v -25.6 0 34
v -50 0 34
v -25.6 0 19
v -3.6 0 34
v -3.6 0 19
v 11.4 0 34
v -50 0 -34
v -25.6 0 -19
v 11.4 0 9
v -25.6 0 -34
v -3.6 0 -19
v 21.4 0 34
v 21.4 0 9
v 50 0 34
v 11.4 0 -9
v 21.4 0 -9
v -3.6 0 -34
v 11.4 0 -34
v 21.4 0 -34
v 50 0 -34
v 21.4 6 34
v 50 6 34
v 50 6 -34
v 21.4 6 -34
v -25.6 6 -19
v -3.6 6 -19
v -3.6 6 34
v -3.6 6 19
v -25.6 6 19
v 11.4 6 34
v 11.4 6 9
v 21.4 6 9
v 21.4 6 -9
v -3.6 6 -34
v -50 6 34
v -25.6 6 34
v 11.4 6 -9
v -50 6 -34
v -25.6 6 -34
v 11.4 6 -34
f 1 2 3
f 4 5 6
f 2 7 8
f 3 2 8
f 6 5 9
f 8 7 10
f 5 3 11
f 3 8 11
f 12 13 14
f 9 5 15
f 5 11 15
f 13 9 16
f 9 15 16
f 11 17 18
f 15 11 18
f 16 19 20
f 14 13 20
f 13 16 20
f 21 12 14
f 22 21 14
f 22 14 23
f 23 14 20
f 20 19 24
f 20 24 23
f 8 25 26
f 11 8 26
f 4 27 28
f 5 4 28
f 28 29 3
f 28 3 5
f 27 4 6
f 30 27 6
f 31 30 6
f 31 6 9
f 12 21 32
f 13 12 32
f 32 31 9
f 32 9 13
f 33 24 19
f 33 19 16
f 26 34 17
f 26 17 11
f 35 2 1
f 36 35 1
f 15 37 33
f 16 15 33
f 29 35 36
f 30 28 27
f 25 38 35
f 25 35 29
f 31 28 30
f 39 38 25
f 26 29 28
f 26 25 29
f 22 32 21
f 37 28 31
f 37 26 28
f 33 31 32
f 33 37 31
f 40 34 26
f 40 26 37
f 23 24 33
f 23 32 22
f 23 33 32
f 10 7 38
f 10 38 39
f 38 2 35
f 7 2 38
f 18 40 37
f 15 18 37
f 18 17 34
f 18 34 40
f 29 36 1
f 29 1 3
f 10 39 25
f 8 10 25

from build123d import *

# Parameters (mm, degrees)
SKETCH1_W           = 100
SKETCH1_H           = 68
BOSS_EXTRUDE1_DEPTH = 6
SKETCH2_W           = 10
SKETCH2_H           = 25
SKETCH2_W_2         = 22
SKETCH2_H_2         = 15
CUT_EXTRUDE1_DEPTH  = 7


with BuildPart() as part:
    # Sketch1 → Boss-Extrude1 (new body)
    with BuildSketch(Plane(origin=(0, 0, 0), x_dir=(1, 0, 0), z_dir=(0, 1, 0))):
        Rectangle(SKETCH1_W, SKETCH1_H)
    extrude(amount=BOSS_EXTRUDE1_DEPTH)

    # Sketch2 → Cut-Extrude1 (cut, through all)
    with BuildSketch(Plane(origin=(0, 6, 0), x_dir=(1, 0, 0), z_dir=(0, 1, 0))):
        with Locations((16.4, -21.5)):
            Rectangle(SKETCH2_W, SKETCH2_H)
        with Locations((-14.6, -26.5)):
            Rectangle(SKETCH2_W_2, SKETCH2_H_2)
    cut_extrude1 = extrude(amount=-CUT_EXTRUDE1_DEPTH, mode=Mode.SUBTRACT)

    # Mirror1: Cut-Extrude1 across plane
    add(cut_extrude1.mirror(Plane.XY), mode=Mode.SUBTRACT)


solid = part.part
